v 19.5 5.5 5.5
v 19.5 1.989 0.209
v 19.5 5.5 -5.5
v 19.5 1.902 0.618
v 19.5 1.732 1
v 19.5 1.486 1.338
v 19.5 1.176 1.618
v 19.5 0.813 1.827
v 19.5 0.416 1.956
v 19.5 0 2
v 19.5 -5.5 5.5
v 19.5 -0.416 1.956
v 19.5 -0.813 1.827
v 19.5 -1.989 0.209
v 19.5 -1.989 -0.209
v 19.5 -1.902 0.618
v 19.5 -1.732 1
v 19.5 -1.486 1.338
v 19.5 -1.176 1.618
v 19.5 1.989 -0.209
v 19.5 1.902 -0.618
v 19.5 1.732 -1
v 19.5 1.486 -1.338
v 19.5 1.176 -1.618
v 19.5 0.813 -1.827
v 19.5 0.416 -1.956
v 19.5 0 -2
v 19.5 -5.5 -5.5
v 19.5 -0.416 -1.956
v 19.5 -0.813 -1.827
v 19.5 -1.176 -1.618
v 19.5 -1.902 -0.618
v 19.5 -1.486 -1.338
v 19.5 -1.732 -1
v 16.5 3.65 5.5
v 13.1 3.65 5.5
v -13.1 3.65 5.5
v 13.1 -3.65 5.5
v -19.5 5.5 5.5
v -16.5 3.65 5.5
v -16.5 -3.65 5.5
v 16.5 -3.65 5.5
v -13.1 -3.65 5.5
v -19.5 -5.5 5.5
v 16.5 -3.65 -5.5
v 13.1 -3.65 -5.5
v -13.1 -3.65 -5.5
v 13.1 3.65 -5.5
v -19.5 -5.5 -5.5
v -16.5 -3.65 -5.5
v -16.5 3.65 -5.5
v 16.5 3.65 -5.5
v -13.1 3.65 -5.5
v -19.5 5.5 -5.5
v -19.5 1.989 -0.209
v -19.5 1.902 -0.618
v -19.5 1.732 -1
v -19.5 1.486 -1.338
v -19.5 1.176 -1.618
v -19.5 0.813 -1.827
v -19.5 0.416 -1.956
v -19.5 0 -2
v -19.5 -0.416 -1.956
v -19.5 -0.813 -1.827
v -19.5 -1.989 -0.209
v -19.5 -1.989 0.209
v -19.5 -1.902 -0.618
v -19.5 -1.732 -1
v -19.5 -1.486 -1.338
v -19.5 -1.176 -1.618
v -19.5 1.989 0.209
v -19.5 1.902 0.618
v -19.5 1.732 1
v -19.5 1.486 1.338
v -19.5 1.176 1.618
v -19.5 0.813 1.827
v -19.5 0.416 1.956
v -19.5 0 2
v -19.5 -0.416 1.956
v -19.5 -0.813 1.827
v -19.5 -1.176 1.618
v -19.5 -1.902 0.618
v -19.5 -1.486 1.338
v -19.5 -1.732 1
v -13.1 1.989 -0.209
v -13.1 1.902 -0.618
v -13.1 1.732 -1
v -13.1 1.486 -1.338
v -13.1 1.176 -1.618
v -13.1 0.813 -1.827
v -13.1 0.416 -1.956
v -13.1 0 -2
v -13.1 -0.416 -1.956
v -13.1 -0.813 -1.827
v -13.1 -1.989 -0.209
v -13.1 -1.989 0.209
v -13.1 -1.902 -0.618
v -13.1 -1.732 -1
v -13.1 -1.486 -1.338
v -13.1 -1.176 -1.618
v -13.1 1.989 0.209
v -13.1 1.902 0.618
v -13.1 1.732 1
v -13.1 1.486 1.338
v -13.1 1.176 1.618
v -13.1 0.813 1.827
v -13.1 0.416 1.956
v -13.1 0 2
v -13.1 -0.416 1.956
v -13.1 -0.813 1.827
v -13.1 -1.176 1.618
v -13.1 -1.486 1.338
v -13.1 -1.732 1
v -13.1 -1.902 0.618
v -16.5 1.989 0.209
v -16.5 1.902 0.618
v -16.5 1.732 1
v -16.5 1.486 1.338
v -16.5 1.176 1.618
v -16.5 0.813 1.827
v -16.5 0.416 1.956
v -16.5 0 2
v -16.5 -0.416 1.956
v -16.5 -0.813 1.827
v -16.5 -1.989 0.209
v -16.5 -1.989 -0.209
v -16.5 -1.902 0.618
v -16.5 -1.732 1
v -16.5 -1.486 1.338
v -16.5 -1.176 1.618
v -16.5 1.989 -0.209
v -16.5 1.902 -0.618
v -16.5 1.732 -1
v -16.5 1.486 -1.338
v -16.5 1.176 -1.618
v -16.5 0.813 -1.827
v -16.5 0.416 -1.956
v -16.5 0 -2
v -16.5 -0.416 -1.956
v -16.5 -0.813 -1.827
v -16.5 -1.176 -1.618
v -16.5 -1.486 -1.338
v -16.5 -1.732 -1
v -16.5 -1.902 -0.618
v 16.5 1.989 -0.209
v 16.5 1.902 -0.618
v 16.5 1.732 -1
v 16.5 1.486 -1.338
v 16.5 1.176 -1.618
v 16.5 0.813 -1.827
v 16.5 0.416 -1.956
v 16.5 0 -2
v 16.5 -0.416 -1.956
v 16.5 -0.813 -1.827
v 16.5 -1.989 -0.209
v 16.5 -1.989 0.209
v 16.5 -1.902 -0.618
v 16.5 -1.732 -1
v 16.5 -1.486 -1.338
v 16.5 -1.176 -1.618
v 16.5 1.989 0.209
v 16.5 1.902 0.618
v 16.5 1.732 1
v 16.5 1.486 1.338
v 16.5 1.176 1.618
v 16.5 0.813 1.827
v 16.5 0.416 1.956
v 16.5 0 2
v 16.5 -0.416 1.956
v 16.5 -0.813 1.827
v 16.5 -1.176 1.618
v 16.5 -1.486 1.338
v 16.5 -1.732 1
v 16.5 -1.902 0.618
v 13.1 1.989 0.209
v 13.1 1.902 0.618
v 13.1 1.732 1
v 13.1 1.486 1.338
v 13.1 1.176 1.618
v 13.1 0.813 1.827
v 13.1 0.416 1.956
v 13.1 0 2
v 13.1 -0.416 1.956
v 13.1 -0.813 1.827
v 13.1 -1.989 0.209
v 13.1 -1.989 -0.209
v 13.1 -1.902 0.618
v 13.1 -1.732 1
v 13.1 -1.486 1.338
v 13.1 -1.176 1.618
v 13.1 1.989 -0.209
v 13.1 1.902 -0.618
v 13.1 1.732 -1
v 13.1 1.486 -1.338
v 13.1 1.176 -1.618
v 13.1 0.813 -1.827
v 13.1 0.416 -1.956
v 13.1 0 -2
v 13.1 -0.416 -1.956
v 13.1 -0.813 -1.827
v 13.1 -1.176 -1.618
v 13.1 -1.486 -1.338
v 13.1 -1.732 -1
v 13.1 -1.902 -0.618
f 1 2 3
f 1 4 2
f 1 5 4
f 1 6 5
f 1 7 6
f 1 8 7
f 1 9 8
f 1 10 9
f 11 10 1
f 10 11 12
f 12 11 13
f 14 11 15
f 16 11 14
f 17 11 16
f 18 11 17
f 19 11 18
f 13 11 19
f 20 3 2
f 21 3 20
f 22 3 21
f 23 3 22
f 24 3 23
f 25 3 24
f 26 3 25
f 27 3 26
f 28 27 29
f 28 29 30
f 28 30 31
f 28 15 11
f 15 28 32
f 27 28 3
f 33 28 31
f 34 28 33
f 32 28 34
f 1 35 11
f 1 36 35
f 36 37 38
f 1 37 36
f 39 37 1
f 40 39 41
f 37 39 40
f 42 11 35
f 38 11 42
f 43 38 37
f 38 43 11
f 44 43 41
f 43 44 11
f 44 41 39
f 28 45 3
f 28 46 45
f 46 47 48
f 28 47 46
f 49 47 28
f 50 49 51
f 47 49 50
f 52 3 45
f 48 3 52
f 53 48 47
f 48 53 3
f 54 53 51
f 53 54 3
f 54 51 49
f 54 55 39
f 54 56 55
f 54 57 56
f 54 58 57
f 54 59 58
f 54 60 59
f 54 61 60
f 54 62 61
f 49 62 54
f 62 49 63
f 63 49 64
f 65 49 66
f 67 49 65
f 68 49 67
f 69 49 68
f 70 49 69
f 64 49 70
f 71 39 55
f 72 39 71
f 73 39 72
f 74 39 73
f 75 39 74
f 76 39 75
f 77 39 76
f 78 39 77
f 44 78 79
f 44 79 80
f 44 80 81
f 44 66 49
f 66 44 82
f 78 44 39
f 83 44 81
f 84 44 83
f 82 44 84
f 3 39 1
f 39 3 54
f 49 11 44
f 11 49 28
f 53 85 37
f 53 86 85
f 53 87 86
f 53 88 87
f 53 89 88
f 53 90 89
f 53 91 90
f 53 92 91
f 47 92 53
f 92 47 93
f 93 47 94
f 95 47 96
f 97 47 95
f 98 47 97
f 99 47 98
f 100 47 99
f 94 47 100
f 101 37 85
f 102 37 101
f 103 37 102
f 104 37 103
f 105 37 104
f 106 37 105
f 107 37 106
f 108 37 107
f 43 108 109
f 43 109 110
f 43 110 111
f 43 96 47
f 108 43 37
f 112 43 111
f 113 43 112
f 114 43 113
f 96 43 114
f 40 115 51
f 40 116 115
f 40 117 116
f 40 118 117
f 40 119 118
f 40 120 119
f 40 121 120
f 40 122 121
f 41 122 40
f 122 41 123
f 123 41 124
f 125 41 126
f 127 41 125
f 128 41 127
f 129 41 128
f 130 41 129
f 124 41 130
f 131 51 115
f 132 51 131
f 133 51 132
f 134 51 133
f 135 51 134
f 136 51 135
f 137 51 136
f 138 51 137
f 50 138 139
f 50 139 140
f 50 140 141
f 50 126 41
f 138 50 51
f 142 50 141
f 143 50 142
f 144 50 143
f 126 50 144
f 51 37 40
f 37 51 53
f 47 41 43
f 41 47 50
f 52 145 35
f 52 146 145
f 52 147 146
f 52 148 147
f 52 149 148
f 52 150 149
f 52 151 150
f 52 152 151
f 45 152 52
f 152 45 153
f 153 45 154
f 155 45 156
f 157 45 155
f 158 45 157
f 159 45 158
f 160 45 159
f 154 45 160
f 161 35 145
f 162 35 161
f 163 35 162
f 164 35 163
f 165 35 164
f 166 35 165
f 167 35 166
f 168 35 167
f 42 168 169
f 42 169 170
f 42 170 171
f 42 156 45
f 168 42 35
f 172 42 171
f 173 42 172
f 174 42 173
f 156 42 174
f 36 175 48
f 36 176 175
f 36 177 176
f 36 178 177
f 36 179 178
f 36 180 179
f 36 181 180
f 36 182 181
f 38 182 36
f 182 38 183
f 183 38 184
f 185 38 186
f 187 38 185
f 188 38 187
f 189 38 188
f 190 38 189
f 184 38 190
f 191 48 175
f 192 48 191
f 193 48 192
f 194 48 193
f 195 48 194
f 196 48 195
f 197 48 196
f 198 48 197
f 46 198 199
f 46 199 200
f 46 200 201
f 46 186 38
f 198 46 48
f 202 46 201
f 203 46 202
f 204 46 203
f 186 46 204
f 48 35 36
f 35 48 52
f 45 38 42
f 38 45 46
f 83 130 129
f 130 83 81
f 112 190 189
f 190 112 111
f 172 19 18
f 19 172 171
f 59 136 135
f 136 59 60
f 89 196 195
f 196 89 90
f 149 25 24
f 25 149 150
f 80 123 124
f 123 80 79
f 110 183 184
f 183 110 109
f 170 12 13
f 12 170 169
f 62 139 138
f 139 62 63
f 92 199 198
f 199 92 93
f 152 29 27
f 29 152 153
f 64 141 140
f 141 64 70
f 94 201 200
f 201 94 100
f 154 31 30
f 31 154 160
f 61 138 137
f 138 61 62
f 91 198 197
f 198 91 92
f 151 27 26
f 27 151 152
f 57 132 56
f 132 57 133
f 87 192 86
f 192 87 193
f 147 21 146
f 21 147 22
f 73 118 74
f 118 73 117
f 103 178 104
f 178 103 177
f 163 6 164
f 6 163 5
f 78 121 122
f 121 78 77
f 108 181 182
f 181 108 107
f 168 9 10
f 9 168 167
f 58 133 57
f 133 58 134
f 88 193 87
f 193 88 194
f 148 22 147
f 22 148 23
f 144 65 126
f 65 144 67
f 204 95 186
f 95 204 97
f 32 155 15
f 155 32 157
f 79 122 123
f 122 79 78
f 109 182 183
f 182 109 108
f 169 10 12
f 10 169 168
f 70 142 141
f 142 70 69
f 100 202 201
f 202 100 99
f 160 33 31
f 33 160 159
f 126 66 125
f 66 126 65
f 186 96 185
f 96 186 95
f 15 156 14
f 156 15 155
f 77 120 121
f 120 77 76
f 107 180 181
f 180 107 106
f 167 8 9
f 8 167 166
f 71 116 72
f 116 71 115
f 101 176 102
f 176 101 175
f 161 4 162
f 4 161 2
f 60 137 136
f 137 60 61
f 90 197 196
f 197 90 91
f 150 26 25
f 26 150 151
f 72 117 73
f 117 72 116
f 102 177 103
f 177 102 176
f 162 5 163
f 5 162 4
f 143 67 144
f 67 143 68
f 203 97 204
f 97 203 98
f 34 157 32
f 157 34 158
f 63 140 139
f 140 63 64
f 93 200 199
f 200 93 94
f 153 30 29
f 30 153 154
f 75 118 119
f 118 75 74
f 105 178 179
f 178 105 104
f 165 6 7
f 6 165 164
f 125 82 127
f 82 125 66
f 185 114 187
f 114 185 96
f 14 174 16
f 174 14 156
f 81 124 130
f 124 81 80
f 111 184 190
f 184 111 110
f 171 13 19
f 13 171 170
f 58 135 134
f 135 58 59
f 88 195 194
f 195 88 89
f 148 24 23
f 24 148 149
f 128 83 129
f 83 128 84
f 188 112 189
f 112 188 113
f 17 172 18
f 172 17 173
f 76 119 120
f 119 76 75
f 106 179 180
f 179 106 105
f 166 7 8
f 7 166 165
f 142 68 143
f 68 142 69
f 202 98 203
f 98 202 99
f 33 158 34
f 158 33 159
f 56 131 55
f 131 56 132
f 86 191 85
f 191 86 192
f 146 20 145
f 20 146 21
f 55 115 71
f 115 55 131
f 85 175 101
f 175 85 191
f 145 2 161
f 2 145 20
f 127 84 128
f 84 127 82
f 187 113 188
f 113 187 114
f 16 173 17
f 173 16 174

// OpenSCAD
nuthole=7.3;
nutheight=3.4;
height=39;

slider=false; // true | false
side=1;       //    1 | -1

difference() {
    cube([height, 11, 11], center=true);
    translate([-(height-nutheight)/2+3, 0, 0])
        cube([nutheight, nuthole, 12], center=true);
    translate([+(height-nutheight)/2-3, 0, 0])
        cube([nutheight, nuthole, 12], center=true);
    rotate([0, 90, 0])
        cylinder(height+1, d=4, $fn=30, center=true);
}

if (slider)
color("red")
rotate([90-90*side,0,0])
difference() {
    translate([0,-(11+7)/2,0])
        cube([height, 7, 11], center=true);
    translate([0,-(11+4)/2,side*7])
        cube([height+1, 4, 11], center=true);
}
